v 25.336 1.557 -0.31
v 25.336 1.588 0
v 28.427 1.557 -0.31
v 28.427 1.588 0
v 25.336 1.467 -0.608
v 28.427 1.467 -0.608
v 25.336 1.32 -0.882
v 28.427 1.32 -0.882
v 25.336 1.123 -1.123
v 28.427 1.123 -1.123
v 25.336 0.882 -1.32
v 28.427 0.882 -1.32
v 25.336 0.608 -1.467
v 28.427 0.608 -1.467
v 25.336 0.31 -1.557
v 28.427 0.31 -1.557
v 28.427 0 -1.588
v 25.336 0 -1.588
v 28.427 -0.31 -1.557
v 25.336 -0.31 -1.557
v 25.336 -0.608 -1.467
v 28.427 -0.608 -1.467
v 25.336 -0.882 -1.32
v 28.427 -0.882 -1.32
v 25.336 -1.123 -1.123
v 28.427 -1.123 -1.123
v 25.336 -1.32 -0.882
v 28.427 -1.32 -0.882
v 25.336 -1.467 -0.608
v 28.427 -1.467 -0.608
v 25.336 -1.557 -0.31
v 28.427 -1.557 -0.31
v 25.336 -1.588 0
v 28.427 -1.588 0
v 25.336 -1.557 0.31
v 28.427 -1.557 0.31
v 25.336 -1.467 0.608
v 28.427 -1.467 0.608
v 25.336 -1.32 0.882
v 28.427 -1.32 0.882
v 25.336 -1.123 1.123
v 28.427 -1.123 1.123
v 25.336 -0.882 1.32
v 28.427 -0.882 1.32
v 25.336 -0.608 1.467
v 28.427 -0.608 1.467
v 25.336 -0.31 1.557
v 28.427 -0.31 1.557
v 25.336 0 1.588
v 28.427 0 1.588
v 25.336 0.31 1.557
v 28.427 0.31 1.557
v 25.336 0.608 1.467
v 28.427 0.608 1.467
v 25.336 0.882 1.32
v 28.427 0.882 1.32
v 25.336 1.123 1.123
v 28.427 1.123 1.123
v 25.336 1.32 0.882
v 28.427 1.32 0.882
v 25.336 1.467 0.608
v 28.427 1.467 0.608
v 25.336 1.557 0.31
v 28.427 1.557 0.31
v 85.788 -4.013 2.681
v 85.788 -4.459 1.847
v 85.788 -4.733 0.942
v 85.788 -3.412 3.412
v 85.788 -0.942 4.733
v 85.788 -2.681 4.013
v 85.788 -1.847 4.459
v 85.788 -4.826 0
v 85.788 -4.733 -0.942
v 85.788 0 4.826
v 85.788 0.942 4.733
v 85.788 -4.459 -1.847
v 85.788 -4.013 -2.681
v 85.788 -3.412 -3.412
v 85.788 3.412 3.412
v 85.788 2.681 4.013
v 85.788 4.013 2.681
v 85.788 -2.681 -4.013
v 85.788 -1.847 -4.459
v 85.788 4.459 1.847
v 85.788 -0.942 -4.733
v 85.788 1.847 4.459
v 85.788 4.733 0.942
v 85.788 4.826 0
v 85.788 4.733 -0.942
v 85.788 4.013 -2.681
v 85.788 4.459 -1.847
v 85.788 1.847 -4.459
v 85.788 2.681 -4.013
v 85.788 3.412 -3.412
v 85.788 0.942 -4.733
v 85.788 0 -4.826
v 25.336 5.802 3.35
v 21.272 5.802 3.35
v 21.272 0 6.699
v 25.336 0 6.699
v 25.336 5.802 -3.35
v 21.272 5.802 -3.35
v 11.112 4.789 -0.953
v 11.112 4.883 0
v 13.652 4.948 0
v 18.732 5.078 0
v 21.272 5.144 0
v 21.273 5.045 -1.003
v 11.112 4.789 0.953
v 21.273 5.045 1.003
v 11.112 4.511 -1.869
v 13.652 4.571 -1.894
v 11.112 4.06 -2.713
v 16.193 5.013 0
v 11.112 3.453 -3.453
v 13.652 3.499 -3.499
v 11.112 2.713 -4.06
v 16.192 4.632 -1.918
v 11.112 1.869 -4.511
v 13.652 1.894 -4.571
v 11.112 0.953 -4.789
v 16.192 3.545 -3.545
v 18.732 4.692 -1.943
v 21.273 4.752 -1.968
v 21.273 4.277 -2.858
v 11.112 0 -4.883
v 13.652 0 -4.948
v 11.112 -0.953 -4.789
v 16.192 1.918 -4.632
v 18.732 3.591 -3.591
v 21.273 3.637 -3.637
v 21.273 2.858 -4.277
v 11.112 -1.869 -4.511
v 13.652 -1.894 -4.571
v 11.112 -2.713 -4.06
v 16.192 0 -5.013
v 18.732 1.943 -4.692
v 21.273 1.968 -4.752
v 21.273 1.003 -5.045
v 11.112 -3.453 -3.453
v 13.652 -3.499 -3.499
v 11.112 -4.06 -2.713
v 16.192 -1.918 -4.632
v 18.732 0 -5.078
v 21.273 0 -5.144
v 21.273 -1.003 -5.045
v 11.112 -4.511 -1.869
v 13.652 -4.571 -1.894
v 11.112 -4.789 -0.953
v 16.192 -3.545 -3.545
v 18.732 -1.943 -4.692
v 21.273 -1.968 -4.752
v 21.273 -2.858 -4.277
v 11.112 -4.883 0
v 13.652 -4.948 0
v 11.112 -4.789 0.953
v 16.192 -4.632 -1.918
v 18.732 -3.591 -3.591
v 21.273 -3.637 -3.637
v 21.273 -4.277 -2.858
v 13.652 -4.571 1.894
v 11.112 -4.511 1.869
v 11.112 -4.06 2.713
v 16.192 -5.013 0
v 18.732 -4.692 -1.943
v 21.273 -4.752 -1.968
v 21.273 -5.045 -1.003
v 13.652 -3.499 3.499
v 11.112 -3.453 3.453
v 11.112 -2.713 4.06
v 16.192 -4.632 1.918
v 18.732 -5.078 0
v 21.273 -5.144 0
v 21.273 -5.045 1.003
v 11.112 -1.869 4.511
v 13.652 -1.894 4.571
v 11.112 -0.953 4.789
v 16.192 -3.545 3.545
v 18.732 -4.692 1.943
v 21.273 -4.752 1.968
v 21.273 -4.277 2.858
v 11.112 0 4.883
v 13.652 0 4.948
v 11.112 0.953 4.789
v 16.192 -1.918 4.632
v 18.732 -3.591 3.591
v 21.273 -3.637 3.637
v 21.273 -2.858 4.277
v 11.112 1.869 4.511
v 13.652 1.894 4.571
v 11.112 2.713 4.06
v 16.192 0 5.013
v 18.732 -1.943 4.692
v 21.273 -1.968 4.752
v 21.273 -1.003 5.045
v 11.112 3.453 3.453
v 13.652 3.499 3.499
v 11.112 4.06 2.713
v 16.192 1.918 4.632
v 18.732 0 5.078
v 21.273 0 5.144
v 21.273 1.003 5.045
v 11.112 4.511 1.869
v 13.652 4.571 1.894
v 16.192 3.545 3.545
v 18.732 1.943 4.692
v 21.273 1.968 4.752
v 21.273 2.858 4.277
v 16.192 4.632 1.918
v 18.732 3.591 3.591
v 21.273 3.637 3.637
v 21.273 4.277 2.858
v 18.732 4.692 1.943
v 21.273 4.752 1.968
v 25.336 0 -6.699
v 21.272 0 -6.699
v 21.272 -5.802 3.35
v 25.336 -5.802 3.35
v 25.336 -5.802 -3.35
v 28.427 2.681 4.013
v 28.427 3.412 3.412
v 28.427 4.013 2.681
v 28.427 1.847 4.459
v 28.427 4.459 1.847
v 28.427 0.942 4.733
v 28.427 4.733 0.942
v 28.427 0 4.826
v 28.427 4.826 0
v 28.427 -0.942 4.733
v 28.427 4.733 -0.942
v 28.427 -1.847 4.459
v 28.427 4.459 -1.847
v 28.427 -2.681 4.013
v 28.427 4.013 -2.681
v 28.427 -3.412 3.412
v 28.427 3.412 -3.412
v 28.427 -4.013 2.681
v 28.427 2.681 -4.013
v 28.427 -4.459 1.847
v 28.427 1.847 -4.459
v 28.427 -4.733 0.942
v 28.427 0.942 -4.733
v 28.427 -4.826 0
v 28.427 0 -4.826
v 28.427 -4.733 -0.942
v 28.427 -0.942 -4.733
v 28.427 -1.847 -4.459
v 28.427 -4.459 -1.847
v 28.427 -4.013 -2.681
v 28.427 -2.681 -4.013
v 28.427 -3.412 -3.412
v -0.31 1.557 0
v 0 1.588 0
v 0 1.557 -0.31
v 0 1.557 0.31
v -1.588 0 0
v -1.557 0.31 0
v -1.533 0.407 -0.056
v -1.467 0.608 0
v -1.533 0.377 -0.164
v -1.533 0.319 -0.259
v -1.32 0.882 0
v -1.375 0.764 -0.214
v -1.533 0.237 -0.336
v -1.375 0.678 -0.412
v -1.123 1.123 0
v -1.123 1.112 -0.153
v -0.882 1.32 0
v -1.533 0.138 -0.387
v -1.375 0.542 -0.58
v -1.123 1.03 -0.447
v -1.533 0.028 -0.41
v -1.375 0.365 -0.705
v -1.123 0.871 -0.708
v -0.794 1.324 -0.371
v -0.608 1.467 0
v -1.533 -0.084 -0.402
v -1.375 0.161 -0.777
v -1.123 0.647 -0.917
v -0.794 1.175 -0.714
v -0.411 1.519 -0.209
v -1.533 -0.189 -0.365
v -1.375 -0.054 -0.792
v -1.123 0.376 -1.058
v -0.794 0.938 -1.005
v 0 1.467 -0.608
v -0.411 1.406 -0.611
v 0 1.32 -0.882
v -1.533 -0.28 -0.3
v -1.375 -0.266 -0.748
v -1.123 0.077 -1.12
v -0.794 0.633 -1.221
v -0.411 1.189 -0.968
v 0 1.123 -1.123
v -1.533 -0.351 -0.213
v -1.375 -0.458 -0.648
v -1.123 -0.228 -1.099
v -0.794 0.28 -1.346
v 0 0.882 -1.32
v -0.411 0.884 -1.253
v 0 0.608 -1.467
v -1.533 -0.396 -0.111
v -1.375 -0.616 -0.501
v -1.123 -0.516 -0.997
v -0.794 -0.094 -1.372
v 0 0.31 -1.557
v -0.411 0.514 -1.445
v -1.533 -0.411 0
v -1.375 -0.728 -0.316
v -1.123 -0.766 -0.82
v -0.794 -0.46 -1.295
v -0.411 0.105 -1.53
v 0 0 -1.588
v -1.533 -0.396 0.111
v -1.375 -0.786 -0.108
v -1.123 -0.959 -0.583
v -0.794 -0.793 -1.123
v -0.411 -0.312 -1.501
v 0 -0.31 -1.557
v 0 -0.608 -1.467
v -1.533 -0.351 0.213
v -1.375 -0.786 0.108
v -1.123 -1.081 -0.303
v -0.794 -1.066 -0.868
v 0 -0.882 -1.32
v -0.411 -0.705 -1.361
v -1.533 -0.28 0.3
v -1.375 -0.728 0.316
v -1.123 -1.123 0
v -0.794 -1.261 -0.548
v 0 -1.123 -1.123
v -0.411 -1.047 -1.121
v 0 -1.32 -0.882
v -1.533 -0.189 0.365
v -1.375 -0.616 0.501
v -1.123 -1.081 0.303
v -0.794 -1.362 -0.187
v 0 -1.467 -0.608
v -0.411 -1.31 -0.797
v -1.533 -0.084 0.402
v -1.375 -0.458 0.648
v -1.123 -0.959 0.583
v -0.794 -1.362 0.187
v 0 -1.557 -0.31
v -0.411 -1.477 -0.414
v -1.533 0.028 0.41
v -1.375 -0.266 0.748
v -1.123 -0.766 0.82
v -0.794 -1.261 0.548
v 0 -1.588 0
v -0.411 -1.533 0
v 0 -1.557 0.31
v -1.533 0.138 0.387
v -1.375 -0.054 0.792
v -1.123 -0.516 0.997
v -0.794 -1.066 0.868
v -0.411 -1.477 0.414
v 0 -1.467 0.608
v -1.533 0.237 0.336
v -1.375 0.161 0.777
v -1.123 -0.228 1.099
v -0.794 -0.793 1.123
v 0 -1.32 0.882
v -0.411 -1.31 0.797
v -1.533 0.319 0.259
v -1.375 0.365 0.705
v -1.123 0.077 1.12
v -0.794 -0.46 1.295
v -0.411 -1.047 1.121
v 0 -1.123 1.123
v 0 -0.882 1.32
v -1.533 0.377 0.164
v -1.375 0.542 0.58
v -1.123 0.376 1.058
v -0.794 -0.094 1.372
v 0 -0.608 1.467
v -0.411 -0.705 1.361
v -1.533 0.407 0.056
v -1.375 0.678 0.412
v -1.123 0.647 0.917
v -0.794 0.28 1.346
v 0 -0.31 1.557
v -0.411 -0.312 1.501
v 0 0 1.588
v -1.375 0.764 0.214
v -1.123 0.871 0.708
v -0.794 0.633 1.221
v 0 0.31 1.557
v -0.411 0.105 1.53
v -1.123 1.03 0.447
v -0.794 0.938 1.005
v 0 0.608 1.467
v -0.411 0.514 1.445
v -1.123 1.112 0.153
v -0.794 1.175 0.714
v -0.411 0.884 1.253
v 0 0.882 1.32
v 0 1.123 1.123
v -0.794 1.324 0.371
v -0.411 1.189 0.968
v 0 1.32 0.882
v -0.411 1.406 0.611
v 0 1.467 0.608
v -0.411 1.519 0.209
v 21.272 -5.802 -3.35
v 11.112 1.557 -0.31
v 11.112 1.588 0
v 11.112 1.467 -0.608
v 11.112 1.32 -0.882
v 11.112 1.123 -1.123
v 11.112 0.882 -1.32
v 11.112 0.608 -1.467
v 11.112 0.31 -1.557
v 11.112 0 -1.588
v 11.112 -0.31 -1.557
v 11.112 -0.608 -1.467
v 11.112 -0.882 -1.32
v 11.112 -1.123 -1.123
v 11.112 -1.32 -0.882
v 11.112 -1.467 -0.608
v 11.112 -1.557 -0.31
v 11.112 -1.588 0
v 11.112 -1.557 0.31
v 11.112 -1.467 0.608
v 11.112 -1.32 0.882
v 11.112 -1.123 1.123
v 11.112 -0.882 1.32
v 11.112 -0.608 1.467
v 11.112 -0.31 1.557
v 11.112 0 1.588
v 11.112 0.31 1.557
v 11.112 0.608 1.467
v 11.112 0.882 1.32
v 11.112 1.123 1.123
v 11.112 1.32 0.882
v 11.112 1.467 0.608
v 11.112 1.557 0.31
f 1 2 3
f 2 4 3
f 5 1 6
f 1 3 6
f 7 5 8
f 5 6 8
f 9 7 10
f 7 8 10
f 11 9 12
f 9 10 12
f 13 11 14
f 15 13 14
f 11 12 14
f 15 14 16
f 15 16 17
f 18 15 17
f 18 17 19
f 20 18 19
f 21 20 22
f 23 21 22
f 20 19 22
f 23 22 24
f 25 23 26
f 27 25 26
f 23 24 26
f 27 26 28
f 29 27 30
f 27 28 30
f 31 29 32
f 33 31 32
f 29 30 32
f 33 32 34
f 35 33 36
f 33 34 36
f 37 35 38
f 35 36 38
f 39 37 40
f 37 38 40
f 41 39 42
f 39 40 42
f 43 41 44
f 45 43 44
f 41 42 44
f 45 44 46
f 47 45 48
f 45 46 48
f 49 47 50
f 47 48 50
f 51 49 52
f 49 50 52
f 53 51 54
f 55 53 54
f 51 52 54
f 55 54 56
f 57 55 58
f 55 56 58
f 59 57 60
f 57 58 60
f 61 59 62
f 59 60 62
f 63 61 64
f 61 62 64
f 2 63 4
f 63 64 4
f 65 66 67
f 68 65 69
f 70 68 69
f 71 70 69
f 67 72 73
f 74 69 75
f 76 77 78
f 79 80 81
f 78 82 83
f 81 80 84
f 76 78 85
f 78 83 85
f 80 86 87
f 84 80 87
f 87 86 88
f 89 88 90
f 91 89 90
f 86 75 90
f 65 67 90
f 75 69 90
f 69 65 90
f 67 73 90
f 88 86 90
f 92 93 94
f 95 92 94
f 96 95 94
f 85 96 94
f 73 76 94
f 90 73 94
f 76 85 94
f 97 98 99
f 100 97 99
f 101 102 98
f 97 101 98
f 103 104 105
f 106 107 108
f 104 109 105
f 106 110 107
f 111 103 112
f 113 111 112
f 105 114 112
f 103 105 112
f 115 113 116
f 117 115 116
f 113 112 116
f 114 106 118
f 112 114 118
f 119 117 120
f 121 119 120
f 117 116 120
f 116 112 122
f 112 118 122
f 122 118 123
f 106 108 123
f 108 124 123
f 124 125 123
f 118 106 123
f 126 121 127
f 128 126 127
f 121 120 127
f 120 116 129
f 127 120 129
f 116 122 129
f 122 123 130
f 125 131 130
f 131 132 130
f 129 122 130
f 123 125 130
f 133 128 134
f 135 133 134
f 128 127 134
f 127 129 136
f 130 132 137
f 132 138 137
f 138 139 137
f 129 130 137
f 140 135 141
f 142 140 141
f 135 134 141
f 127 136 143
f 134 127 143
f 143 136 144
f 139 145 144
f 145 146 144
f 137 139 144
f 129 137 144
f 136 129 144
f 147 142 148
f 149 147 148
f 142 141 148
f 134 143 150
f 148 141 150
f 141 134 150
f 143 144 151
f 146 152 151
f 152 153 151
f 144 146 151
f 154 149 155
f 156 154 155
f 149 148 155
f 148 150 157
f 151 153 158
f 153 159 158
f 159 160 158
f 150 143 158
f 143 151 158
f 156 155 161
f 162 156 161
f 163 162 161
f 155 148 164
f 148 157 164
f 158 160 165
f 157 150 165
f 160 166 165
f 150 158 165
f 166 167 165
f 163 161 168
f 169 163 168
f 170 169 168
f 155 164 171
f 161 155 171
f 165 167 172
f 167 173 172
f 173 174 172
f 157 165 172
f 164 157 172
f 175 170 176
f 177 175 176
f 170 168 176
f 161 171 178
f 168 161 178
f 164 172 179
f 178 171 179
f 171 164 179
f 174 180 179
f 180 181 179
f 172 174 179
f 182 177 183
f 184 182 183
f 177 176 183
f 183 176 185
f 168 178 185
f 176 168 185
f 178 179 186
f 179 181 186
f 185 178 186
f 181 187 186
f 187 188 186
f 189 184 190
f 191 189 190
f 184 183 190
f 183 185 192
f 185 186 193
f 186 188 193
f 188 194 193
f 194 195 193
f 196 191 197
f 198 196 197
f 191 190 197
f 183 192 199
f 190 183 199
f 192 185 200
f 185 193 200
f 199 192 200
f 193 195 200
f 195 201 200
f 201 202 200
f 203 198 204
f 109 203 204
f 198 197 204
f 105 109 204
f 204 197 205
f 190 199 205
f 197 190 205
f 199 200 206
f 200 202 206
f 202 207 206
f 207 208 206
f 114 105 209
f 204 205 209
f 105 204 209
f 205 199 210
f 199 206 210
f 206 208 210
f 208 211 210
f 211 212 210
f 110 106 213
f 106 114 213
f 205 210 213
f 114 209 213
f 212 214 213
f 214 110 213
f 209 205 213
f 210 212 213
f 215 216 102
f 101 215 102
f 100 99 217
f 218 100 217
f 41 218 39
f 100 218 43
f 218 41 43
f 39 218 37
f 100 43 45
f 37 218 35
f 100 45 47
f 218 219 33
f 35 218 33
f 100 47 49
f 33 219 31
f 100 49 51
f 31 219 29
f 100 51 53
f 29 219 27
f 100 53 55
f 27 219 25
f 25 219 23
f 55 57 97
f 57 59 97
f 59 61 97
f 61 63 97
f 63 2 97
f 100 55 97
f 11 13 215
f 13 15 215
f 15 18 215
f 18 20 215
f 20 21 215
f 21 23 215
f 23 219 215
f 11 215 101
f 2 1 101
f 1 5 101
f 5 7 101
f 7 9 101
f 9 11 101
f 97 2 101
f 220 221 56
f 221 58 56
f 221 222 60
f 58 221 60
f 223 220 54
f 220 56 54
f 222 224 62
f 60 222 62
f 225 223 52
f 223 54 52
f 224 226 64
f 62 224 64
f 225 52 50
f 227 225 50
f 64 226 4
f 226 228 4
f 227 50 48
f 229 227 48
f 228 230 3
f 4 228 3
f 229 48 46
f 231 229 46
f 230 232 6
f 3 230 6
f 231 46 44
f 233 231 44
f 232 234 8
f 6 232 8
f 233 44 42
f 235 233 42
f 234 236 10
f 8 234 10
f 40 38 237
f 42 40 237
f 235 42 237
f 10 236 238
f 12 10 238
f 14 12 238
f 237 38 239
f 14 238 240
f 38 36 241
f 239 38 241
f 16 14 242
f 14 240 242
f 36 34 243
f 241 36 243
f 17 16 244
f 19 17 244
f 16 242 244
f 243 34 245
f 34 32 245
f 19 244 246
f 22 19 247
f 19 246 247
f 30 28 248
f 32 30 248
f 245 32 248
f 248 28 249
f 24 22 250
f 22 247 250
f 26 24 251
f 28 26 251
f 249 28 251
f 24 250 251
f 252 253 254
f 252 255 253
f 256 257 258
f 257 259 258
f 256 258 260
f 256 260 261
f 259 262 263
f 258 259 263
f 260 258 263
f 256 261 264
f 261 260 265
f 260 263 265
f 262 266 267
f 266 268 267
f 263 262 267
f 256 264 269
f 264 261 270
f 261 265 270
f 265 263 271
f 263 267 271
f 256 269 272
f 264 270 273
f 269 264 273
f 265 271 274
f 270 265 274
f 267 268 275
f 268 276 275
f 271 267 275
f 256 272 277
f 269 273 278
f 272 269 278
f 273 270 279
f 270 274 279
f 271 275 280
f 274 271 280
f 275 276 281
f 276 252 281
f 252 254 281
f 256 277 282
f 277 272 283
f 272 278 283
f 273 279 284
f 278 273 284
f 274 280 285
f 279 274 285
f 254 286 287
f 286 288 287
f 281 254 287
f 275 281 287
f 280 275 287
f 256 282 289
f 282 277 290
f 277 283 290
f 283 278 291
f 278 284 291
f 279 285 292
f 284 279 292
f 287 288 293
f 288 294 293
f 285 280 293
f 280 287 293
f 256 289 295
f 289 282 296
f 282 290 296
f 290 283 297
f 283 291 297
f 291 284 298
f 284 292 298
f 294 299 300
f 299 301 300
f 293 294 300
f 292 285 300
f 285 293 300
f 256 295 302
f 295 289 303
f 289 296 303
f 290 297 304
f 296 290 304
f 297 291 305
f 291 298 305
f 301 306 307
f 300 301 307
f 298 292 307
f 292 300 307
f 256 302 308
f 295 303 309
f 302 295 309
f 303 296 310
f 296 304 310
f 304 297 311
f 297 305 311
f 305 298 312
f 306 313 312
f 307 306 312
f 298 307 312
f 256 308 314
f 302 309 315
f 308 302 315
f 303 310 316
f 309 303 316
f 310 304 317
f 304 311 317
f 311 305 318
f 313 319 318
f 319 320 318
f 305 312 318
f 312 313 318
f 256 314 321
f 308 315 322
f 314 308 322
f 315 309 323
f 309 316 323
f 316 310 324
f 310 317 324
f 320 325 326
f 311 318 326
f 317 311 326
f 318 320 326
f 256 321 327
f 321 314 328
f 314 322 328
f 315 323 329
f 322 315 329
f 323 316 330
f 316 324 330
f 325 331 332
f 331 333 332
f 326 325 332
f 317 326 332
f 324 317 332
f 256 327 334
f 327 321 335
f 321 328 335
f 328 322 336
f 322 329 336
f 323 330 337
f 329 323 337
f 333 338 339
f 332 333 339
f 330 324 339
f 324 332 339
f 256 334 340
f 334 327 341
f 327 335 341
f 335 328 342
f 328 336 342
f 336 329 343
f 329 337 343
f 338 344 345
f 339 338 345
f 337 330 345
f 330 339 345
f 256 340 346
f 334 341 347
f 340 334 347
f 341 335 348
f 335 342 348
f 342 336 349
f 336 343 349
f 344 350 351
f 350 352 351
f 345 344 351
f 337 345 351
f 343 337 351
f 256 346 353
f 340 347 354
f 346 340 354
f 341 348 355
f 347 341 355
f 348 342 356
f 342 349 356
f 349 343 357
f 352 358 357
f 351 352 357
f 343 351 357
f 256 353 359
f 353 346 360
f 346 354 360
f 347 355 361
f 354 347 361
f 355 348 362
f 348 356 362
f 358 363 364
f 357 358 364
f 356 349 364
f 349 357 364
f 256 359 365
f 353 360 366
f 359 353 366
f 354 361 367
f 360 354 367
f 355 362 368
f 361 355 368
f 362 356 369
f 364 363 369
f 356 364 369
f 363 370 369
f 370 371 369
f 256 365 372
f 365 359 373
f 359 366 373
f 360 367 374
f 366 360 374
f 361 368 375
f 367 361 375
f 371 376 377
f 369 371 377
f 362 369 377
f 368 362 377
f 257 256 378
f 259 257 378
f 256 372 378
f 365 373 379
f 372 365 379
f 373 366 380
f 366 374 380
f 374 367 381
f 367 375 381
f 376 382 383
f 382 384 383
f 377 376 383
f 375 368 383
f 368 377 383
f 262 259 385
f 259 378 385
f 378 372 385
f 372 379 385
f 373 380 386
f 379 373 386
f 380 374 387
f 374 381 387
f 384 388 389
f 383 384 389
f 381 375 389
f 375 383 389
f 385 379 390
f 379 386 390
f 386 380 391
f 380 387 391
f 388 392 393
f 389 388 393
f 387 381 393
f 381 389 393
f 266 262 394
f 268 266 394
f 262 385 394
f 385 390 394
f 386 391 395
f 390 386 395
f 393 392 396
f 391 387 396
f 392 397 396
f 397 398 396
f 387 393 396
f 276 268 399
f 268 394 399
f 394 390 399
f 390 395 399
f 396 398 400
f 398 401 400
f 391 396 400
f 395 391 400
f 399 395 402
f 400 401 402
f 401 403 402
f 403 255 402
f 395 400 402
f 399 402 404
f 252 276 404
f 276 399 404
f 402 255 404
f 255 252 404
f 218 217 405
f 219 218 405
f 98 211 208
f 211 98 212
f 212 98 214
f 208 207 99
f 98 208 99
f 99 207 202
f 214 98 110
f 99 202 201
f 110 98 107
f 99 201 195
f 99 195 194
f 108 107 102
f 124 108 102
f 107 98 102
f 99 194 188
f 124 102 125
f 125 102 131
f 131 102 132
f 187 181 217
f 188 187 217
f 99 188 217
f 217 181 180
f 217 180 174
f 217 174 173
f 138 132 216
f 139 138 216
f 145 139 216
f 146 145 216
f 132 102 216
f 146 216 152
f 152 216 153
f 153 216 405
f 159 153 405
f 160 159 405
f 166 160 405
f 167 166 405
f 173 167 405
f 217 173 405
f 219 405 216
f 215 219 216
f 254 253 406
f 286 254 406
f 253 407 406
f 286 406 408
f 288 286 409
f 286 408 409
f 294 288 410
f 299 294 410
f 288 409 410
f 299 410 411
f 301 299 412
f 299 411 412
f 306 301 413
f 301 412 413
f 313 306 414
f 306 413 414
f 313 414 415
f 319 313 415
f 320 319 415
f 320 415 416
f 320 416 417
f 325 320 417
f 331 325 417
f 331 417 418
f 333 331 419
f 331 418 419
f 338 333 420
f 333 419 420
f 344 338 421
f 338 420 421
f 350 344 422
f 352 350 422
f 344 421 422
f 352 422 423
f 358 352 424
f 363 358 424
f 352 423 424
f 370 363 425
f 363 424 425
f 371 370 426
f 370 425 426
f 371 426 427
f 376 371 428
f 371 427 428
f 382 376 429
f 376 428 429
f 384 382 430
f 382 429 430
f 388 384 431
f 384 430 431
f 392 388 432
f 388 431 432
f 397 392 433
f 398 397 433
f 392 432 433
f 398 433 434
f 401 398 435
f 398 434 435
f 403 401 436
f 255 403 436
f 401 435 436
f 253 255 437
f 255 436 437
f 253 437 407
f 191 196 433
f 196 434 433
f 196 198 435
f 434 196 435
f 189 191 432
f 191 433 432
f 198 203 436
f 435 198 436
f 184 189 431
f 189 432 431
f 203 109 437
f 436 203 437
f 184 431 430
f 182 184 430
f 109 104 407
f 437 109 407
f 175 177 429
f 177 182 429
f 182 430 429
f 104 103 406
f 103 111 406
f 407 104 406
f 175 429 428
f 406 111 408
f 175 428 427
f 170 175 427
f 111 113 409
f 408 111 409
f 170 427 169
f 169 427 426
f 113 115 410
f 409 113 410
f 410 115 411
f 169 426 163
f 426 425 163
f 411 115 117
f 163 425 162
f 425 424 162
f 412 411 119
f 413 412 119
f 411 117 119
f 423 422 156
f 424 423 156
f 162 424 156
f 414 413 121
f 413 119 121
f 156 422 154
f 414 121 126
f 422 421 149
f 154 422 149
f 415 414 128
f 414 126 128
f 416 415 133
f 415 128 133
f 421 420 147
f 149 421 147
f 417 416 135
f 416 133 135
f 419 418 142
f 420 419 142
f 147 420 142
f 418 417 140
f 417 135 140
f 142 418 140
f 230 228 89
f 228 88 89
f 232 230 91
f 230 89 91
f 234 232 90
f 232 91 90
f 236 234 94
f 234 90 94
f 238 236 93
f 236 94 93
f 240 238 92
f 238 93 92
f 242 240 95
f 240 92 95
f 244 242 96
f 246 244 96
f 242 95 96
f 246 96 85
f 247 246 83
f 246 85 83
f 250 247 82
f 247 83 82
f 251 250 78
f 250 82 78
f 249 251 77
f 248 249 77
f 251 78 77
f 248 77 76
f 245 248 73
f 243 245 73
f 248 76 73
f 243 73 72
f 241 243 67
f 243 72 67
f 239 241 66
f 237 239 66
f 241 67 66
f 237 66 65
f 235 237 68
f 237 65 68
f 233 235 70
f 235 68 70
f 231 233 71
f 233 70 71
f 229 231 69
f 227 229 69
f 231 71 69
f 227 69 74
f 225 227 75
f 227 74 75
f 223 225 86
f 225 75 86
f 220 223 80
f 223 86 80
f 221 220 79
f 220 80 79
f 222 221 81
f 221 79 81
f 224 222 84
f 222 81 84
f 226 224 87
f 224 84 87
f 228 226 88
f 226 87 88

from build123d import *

# Parameters (mm, degrees)
CUT_EXTRUDE1_START = -4.064
SKETCH2_R          = 9.134112775
CUT_EXTRUDE1_DEPTH = 4.064


with BuildPart() as part:
    # Sketch1 → Revolve1 (revolve)
    with BuildSketch(Plane.XY):
        with BuildLine():
            Line((0, 1.5875), (11.1125, 1.5875))
            Line((11.1125, 1.5875), (11.1125, 4.882774376))
            Line((11.1125, 4.882774376), (21.2725, 5.1435))
            Line((21.2725, 5.1435), (21.2725, 6.699174823))
            Line((21.2725, 6.699174823), (25.3365, 6.699174823))
            Line((25.3365, 6.699174823), (25.3365, 1.5875))
            Line((25.3365, 1.5875), (28.426855679, 1.5875))
            Line((28.426855679, 1.5875), (28.426855679, 4.826))
            Line((28.426855679, 4.826), (85.7885, 4.826))
            Line((85.7885, 4.826), (85.7885, 0))
            Line((85.7885, 0), (0, 0))
            Line((0, 0), (-1.5875, 0))
            ThreePointArc((-1.5875, 0), (-1.122532015, 1.122532015), (0, 1.5875))
        make_face()
    revolve(axis=Axis((85.7885, 0, 0), (-1, 0, 0)))

    # Sketch2 → Cut-Extrude1 (cut)
    with BuildSketch(Plane(origin=(25.3365, 0, 0), x_dir=(0, 0, -1), z_dir=(1, 0, 0)).offset(CUT_EXTRUDE1_START)):
        Circle(SKETCH2_R)
        Polygon((6.699174823, 0), (3.349587412, 5.801655581), (-3.349587412, 5.801655581), (-6.699174823, 0), (-3.349587412, -5.801655581), (3.349587412, -5.801655581), align=None, mode=Mode.SUBTRACT)
    extrude(amount=CUT_EXTRUDE1_DEPTH, mode=Mode.SUBTRACT)


solid = part.part
